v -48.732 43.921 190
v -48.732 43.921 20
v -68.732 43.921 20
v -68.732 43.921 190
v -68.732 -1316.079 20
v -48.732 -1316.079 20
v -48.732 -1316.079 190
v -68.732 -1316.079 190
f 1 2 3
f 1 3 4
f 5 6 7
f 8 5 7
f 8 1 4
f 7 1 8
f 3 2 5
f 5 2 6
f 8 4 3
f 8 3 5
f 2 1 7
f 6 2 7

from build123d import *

# Parameters (mm, degrees)
F0_W     = 1360
F0_H     = 170
F1_DEPTH = 20
F2_ANGLE = 90
F3_ANGLE = 90


with BuildPart() as f1:
    # F0 (on Top) → F1 (new body)
    with BuildSketch(Plane.XY):
        with Locations((611.2681257427, 128.9208378189)):
            Rectangle(F0_W, F0_H)
    extrude(amount=F1_DEPTH)


with BuildPart() as f1_1:
    # F2: moved
    add(f1.part.rotate(Axis((-68.7318742573, 43.9208378189, 10), (0, 0, -1)), F2_ANGLE))


with BuildPart() as f1_2:
    # F3: moved
    add(f1_1.part.rotate(Axis((-68.7318742573, -636.0791621811, 20), (0, -1, 0)), F3_ANGLE))


solid = f1_2.part
